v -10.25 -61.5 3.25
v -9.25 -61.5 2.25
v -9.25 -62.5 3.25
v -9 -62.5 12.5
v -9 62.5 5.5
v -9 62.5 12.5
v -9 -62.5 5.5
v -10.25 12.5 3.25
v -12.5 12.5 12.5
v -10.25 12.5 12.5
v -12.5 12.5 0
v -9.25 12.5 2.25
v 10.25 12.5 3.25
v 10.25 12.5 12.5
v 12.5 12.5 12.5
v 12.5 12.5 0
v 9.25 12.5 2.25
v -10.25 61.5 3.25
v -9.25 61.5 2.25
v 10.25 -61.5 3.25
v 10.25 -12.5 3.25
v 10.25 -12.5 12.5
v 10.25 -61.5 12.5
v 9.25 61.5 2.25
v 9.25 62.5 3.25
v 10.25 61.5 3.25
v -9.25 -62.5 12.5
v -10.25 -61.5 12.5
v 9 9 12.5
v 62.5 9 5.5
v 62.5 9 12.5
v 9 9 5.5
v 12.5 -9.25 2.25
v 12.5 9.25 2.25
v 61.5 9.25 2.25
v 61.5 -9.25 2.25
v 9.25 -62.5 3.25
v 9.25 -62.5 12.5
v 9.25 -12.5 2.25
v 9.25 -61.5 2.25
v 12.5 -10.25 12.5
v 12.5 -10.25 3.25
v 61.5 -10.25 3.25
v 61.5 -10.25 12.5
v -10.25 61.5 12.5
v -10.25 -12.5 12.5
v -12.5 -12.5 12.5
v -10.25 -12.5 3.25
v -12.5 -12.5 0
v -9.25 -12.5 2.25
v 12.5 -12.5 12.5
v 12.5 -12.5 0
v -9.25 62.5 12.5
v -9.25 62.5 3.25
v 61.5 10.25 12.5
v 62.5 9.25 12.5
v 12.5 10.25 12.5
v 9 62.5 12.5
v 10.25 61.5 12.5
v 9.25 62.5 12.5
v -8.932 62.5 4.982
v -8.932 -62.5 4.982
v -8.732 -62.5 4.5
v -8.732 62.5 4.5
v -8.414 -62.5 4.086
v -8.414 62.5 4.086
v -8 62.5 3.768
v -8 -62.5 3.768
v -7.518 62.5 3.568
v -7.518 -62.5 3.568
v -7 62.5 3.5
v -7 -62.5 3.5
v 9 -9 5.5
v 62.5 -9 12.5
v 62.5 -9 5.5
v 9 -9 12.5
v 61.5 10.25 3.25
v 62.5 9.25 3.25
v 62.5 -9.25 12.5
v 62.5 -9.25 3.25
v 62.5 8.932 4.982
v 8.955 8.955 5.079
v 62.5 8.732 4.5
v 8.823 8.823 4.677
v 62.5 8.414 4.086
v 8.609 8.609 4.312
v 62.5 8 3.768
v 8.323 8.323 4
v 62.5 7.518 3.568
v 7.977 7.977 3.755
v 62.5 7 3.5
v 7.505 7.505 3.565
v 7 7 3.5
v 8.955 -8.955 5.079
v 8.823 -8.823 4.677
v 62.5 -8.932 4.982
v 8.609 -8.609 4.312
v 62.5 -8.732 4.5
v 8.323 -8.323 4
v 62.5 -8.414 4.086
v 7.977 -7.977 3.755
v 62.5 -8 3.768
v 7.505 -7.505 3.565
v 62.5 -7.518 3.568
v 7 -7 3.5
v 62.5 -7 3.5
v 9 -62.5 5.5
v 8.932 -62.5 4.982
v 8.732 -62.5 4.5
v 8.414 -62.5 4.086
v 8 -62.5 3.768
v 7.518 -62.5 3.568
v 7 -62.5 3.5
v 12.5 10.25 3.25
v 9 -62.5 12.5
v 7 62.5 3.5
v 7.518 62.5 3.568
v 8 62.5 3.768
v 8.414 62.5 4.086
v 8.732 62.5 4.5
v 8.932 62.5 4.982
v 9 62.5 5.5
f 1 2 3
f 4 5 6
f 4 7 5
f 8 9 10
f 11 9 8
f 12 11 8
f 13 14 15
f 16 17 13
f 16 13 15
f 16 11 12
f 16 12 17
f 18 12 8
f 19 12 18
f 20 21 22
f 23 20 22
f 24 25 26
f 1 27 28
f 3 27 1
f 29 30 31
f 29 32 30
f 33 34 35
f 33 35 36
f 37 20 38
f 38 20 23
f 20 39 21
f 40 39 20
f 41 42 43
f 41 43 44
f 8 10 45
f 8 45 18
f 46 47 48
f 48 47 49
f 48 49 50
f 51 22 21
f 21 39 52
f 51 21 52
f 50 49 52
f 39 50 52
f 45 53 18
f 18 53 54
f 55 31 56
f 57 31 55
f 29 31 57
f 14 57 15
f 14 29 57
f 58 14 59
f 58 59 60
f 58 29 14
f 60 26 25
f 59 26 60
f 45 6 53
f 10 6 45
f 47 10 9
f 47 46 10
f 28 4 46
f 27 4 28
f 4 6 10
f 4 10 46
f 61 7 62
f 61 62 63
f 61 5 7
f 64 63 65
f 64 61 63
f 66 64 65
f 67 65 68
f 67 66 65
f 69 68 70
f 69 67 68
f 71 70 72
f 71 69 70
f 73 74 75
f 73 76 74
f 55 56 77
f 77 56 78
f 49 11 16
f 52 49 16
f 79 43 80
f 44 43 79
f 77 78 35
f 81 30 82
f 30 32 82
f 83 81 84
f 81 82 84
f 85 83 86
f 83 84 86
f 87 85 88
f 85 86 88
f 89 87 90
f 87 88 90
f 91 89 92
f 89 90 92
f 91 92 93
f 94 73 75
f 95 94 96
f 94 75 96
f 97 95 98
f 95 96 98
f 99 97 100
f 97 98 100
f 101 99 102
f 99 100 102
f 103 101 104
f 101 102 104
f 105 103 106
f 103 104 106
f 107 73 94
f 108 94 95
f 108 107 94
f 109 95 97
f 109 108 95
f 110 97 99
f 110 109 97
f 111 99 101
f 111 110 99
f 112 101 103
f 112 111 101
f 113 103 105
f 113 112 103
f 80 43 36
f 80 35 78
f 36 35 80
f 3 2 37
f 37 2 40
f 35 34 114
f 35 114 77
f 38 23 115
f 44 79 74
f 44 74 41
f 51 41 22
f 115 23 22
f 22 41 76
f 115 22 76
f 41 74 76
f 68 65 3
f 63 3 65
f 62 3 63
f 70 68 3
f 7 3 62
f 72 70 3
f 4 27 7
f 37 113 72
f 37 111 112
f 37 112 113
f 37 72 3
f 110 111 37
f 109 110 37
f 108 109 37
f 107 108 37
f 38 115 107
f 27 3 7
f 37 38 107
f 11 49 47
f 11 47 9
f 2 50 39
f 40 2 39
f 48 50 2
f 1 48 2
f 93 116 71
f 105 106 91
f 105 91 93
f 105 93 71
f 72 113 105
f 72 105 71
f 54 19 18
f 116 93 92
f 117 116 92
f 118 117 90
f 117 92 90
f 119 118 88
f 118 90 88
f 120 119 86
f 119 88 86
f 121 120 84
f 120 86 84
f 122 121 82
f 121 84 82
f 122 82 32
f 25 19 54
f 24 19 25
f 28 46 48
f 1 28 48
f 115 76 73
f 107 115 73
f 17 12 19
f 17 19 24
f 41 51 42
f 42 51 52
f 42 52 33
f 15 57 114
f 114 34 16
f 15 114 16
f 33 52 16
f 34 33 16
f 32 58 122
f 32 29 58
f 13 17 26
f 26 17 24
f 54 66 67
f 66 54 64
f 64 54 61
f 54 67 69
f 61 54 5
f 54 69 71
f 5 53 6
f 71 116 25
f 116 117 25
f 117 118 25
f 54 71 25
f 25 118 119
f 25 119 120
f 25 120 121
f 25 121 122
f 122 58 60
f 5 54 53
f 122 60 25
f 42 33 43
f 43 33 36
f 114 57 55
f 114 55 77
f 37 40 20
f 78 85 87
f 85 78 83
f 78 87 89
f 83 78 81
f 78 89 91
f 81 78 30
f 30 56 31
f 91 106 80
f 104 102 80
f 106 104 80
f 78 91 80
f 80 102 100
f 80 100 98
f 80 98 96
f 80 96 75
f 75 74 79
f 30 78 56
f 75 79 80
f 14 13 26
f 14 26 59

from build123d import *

# Parameters (mm, degrees)
SKETCH_W        = 25
SKETCH_H        = 25
PAD_DEPTH       = 12.5
THICKNESS_T     = -3.5
SKETCH001_W     = 18
SKETCH001_H     = 9
POCKET_DEPTH    = 3.5
PAD001_DEPTH    = 50
CHAMFER_SIZE    = 1
SKETCH003_W     = 18
SKETCH003_H     = 9
POCKET001_DEPTH = 3.5
PAD002_DEPTH    = 50
CHAMFER001_SIZE = 1
SKETCH005_W     = 18
SKETCH005_H     = 9
POCKET002_DEPTH = 3.5
PAD003_DEPTH    = 50
CHAMFER002_SIZE = 1
FILLET_R        = 2
FILLET001_R     = 2
FILLET002_R     = 2
FILLET003_R     = 2
FILLET004_R     = 2


with BuildPart() as part:
    # Sketch → Pad (new body)
    with BuildSketch(Plane.XY):
        Rectangle(SKETCH_W, SKETCH_H)
    extrude(amount=PAD_DEPTH)

    # Thickness
    thickness_openings = [part.faces().sort_by_distance(p)[0] for p in [
        (0, 0, 12.5),
    ]]
    offset(amount=THICKNESS_T, openings=thickness_openings, kind=Kind.INTERSECTION)

    # Sketch001 (on Face2 of Thickness) → Pocket (cut)
    with BuildSketch(Plane.XZ.offset(12.5)):
        with Locations((0, 8)):
            Rectangle(SKETCH001_W, SKETCH001_H)
    extrude(amount=-POCKET_DEPTH, mode=Mode.SUBTRACT)

    # Sketch002 (on Face3 of Pocket) → Pad001 (join)
    with BuildSketch(Plane.XZ.offset(12.5)):
        Polygon((-10.25, 12.5), (-10.25, 2.25), (10.25, 2.25), (10.25, 12.5), (9, 12.5), (9, 3.5), (-9, 3.5), (-9, 12.5), align=None)
    extrude(amount=PAD001_DEPTH)

    # Chamfer
    chamfer_edges = [part.edges().sort_by_distance(p)[0] for p in [
        (0, -62.5, 2.25),
        (10.25, -37.5, 2.25),
        (-10.25, -37.5, 2.25),
        (10.25, -62.5, 7.375),
        (-10.25, -62.5, 7.375),
    ]]
    chamfer(chamfer_edges, length=CHAMFER_SIZE)

    # Sketch003 (on Face6 of Chamfer) → Pocket001 (cut)
    with BuildSketch(Plane.YZ.offset(12.5)):
        with Locations((0, 8)):
            Rectangle(SKETCH003_W, SKETCH003_H)
    extrude(amount=-POCKET001_DEPTH, mode=Mode.SUBTRACT)

    # Sketch004 (on Face6 of Pocket001) → Pad002 (join)
    with BuildSketch(Plane.YZ.offset(12.5)):
        Polygon((10.25, 12.5), (10.25, 2.25), (-10.25, 2.25), (-10.25, 12.5), (-9, 12.5), (-9, 3.5), (9, 3.5), (9, 12.5), align=None)
    extrude(amount=PAD002_DEPTH)

    # Chamfer001
    chamfer001_edges = [part.edges().sort_by_distance(p)[0] for p in [
        (37.5, -10.25, 2.25),
        (62.5, -10.25, 7.375),
        (62.5, 0, 2.25),
        (62.5, 10.25, 7.375),
        (37.5, 10.25, 2.25),
    ]]
    chamfer(chamfer001_edges, length=CHAMFER001_SIZE)

    # Sketch005 → Pocket002 (cut)
    with BuildSketch(Plane(origin=(0, 12.5, 0), x_dir=(-1, 0, 0), z_dir=(0, 1, 0))):
        with Locations((0, 8)):
            Rectangle(SKETCH005_W, SKETCH005_H)
    extrude(amount=-POCKET002_DEPTH, mode=Mode.SUBTRACT)

    # Sketch006 (on Face6 of Pocket002) → Pad003 (join)
    with BuildSketch(Plane(origin=(0, 12.5, 0), x_dir=(-1, 0, 0), z_dir=(0, 1, 0))):
        Polygon((10.25, 12.5), (10.25, 2.25), (-10.25, 2.25), (-10.25, 12.5), (-9, 12.5), (-9, 3.5), (9, 3.5), (9, 12.5), align=None)
    extrude(amount=PAD003_DEPTH)

    # Chamfer002
    chamfer002_edges = [part.edges().sort_by_distance(p)[0] for p in [
        (-10.25, 37.5, 2.25),
        (0, 62.5, 2.25),
        (-10.25, 62.5, 7.375),
        (10.25, 62.5, 7.375),
        (10.25, 37.5, 2.25),
    ]]
    chamfer(chamfer002_edges, length=CHAMFER002_SIZE)

    # Fillet
    fillet_edges = [part.edges().sort_by_distance(p)[0] for p in [
        (-9, 37.5, 3.5),
    ]]
    fillet(fillet_edges, radius=FILLET_R)

    # Fillet001
    fillet001_edges = [part.edges().sort_by_distance(p)[0] for p in [
        (9, 37.5, 3.5),
    ]]
    fillet(fillet001_edges, radius=FILLET001_R)

    # Fillet002
    fillet002_edges = [part.edges().sort_by_distance(p)[0] for p in [
        (37.5, 9, 3.5),
    ]]
    fillet(fillet002_edges, radius=FILLET002_R)

    # Fillet003
    fillet003_edges = [part.edges().sort_by_distance(p)[0] for p in [
        (9, -37.5, 3.5),
    ]]
    fillet(fillet003_edges, radius=FILLET003_R)

    # Fillet004
    fillet004_edges = [part.edges().sort_by_distance(p)[0] for p in [
        (37.5, -9, 3.5),
    ]]
    fillet(fillet004_edges, radius=FILLET004_R)


solid = part.part
